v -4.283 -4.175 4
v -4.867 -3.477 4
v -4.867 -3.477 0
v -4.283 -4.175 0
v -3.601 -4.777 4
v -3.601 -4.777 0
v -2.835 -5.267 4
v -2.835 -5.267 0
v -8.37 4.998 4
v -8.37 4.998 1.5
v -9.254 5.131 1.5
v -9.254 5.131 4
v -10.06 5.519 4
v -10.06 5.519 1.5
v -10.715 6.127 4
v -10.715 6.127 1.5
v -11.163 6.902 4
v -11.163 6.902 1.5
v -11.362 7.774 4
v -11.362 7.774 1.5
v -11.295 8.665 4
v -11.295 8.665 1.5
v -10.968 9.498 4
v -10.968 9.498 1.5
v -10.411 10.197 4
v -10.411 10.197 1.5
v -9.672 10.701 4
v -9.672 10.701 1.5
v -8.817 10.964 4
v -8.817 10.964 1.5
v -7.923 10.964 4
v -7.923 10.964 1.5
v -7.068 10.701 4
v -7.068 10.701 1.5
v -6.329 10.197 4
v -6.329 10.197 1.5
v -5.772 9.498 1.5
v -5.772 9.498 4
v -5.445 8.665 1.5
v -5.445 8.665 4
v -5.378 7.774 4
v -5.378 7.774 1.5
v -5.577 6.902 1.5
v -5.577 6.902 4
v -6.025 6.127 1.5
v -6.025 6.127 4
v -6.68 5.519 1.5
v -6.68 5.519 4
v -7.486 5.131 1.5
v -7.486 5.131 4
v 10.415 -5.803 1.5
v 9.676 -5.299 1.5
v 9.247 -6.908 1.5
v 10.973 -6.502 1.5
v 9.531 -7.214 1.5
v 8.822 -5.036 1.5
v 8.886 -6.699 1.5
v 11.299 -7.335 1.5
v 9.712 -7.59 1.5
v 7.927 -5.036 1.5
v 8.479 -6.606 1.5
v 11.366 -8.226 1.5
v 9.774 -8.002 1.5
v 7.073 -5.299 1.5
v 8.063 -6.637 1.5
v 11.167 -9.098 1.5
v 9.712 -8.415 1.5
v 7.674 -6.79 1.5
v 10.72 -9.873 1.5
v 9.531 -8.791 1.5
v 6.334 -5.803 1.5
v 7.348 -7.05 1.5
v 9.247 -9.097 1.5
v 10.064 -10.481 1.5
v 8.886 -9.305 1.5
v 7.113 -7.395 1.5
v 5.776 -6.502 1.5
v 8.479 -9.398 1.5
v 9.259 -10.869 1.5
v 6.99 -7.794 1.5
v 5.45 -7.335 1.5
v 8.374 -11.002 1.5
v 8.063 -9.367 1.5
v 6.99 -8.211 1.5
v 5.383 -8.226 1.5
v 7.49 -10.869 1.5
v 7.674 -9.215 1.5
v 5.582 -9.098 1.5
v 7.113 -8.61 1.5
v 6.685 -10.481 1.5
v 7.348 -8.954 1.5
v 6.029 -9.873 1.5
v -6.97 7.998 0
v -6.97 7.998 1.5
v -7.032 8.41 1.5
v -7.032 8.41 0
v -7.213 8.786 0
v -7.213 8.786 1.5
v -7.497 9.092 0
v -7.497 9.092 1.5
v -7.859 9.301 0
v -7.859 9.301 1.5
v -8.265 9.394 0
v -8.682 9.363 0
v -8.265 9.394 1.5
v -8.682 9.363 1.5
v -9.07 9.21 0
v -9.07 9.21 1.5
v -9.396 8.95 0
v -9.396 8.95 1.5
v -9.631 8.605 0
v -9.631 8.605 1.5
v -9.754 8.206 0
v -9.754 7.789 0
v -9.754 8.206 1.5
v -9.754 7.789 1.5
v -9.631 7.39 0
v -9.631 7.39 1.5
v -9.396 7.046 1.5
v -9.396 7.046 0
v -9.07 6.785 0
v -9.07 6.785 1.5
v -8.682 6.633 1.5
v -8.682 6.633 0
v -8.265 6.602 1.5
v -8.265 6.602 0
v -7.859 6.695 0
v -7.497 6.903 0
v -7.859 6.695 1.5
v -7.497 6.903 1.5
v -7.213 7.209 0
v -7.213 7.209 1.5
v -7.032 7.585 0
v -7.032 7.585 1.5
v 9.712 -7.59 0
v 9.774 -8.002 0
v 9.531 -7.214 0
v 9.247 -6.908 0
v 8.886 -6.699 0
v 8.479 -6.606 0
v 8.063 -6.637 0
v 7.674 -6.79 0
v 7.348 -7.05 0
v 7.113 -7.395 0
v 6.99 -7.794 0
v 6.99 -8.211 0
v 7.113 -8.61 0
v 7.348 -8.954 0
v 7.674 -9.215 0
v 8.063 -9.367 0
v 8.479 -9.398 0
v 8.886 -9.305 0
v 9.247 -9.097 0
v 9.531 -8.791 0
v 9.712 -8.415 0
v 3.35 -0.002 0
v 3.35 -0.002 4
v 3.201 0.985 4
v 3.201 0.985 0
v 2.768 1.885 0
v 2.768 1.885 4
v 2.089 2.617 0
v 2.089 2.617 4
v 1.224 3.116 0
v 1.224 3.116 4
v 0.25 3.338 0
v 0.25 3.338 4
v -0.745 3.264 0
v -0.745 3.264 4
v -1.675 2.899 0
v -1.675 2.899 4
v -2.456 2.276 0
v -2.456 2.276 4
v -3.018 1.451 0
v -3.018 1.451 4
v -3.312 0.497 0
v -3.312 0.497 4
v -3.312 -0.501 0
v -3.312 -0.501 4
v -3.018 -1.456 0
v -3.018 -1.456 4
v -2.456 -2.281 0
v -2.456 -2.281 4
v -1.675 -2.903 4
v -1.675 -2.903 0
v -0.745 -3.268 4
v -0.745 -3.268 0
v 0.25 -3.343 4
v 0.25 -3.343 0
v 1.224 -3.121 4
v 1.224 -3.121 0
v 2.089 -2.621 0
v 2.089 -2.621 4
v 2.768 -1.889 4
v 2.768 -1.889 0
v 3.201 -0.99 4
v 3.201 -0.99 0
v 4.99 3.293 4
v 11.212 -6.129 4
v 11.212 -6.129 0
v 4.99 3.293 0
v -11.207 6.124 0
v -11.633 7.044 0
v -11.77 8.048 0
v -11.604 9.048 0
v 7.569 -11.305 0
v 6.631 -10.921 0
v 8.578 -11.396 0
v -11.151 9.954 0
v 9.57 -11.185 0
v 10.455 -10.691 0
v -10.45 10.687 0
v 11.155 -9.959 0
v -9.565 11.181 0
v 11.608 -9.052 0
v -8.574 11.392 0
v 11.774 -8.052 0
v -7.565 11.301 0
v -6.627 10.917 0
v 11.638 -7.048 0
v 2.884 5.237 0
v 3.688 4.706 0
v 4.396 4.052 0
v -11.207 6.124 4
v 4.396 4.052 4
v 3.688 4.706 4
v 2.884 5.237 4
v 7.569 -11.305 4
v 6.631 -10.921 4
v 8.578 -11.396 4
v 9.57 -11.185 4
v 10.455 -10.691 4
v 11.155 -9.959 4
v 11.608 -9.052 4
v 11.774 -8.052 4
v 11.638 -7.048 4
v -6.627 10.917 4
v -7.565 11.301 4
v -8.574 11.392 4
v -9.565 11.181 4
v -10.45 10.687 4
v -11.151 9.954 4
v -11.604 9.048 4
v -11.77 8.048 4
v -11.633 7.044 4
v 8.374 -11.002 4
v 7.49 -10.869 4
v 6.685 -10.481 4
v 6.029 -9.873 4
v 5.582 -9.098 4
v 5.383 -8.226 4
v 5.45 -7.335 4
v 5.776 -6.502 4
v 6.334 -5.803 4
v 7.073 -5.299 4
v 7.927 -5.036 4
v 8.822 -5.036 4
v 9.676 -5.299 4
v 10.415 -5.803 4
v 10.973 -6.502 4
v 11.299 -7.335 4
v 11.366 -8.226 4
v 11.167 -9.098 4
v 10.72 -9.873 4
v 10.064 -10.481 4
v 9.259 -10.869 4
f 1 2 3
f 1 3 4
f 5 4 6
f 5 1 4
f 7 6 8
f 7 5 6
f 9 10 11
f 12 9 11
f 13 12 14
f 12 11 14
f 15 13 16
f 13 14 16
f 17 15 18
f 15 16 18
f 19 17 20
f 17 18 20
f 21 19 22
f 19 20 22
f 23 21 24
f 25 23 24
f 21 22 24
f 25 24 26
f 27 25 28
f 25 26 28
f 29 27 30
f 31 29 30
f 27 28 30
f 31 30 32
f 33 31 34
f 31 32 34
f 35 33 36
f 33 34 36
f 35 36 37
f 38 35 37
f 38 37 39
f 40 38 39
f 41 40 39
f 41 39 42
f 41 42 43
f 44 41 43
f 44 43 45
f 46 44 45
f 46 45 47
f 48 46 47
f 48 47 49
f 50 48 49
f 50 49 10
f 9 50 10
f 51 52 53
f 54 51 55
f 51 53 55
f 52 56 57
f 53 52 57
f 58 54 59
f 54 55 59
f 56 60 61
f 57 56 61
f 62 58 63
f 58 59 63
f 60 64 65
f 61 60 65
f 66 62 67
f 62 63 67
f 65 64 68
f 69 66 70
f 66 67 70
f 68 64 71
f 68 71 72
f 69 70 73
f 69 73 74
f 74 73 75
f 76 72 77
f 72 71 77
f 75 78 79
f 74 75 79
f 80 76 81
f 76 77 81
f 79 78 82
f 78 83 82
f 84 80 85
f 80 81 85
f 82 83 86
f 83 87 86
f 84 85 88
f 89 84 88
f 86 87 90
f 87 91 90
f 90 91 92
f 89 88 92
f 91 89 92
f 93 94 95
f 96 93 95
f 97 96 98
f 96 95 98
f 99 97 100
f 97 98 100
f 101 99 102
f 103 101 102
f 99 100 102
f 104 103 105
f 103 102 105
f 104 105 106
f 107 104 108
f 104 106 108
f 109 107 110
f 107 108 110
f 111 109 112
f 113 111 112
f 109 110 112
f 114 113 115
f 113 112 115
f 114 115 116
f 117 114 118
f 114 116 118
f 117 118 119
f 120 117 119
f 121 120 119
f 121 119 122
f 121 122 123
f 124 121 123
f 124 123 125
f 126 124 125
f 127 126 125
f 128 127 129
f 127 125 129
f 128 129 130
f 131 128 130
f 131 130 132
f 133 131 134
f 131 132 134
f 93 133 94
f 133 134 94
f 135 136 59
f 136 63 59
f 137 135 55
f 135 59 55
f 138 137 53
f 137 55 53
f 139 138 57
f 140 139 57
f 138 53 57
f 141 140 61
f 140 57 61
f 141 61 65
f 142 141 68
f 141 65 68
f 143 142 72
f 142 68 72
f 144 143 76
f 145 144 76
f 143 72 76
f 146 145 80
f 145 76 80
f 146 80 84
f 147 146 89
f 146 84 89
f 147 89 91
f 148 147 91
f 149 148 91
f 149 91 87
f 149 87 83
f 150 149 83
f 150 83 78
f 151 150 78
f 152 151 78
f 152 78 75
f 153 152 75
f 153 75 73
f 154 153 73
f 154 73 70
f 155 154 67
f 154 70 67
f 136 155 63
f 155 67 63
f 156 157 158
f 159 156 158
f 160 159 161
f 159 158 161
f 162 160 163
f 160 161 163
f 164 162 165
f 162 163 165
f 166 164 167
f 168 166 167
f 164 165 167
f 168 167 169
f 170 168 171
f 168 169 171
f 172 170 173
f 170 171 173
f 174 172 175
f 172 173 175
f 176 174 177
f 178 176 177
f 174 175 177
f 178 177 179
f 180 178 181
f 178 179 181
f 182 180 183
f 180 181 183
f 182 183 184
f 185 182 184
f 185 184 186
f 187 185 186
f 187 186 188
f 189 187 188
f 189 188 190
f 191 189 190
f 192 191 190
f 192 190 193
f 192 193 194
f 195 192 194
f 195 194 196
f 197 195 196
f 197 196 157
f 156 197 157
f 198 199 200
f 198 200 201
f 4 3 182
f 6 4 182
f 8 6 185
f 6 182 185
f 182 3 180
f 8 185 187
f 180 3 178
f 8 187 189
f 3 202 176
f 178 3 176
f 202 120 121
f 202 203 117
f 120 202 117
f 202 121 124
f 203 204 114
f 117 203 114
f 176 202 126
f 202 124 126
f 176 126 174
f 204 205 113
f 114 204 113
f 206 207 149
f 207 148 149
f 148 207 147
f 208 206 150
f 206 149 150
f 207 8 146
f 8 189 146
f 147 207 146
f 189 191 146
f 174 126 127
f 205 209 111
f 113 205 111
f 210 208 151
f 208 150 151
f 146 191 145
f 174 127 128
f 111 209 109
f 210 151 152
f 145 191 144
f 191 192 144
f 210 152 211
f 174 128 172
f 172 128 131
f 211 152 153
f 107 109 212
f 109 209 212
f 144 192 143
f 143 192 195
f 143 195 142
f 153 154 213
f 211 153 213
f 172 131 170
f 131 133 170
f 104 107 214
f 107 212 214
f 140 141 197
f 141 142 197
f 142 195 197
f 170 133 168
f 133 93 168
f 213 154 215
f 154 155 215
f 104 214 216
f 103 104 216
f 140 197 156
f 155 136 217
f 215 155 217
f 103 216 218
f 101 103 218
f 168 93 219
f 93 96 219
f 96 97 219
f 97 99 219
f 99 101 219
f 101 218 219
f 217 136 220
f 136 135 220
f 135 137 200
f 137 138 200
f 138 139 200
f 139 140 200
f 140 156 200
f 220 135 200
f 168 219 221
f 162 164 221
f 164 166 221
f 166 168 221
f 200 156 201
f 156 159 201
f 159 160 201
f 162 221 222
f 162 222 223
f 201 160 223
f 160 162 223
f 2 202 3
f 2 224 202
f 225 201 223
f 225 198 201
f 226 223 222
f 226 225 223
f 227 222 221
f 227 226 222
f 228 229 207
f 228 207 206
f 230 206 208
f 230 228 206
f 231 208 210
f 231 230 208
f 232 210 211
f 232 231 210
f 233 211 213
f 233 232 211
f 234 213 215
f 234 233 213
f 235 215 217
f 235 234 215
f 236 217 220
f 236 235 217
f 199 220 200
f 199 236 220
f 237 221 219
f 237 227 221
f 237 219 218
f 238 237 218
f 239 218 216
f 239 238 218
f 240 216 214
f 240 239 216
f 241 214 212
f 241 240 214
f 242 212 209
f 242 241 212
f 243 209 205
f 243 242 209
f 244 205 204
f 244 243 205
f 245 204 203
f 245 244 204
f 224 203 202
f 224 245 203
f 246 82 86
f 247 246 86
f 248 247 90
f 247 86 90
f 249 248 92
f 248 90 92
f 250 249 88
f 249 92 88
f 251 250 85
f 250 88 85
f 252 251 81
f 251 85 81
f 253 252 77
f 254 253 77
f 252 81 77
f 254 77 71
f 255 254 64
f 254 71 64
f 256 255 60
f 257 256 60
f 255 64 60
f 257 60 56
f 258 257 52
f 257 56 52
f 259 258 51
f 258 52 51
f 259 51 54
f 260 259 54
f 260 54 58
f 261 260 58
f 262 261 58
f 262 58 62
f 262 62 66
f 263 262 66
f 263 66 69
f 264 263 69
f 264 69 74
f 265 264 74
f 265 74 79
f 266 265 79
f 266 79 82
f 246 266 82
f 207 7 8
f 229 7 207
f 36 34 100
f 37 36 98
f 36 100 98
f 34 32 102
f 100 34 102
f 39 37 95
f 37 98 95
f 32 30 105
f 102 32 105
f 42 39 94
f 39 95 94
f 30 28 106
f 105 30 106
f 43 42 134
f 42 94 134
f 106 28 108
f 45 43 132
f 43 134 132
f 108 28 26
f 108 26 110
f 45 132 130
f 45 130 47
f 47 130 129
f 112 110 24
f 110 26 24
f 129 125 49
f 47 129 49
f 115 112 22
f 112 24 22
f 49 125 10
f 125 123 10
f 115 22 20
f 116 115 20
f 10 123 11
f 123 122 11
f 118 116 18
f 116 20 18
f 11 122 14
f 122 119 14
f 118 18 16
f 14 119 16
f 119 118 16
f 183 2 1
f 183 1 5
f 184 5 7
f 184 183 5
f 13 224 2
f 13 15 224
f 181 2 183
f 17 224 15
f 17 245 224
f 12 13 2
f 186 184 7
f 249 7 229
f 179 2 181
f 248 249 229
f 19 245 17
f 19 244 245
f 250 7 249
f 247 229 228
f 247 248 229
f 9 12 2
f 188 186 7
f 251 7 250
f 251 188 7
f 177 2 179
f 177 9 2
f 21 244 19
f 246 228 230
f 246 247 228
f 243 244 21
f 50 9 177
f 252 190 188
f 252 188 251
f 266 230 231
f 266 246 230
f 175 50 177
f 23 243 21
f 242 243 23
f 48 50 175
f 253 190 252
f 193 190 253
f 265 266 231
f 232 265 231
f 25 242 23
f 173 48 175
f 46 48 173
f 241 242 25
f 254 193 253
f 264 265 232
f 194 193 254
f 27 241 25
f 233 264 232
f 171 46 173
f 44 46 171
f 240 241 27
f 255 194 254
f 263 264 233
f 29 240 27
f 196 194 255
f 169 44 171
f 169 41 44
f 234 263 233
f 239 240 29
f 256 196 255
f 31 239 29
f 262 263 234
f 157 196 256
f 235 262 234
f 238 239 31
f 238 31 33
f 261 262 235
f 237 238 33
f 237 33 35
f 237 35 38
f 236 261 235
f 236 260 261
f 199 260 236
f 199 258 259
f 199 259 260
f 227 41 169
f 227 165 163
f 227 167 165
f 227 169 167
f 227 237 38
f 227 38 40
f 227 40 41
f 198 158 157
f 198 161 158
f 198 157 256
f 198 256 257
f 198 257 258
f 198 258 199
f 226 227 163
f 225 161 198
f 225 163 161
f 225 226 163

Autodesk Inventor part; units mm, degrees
ref_plane "YZ Plane" through (0, 0, 0) normal (1, 0, 0) x (0, 1, 0)
ref_plane "XZ Plane" through (0, 0, 0) normal (0, 1, 0) x (-1, 0, 0)
ref_plane "XY Plane" through (0, 0, 0) normal (0, 0, 1) x (1, 0, 0)
sketch "Skizze1" plane through (0, 0, 0) normal (0, 0, 1) x (1, 0, 0)
  circle A0 centre (0.0001, -0.0022) radius 3.9802 projected
  circle A1 centre (-8.37, 7.9978) radius 1.4 projected
  circle A2 centre (8.3745, -8.0022) radius 1.4 projected
  line L0 (-9.5383, 7.2264) -> (-3.2198, -2.3418)
  line L1 (-7.6522, 9.1998) -> (1.8915, 3.4999)
  line L2 (9.5428, -7.2307) -> (3.3215, 2.191)
  line L3 (-1.8517, -3.5253) -> (7.6567, -9.2041)
  point P0 (0, 0)
extrude "Extrusion1" add sketch "Skizze1" along normal blind 4
sketch "Skizze2" plane through (0, 0, 4) normal (0, 0, 1) x (1, 0, 0)
  arc A0 (-7.6522, 9.1998) -> (-9.5383, 7.2264) centre (-8.37, 7.9978) ccw projected
  line L0 (-9.5383, 7.2264) -> (-3.2198, -2.3418) projected
  arc A1 (-3.2198, -2.3418) -> (-1.8517, -3.5253) centre (0.0001, -0.0022) ccw projected
  line L1 (-1.8517, -3.5253) -> (7.6567, -9.2041) projected
  arc A2 (7.6567, -9.2041) -> (9.5428, -7.2307) centre (8.3745, -8.0022) ccw projected
  line L2 (9.5428, -7.2307) -> (3.3215, 2.191) projected
  arc A3 (3.3215, 2.191) -> (1.8915, 3.4999) centre (0.0001, -0.0022) ccw projected
  line L3 (1.8915, 3.4999) -> (-7.6522, 9.1998) projected
  arc A4 (-6.6267, 10.9169) -> (-11.2072, 6.1243) centre (-8.37, 7.9978) ccw
  line L4 (-11.2072, 6.1243) -> (-4.8666, -3.4774)
  arc A5 (-4.8666, -3.4774) -> (-2.8352, -5.2674) centre (0.0001, -0.0022) ccw
  line L5 (-2.8352, -5.2674) -> (6.6312, -10.9212)
  arc A6 (6.6312, -10.9212) -> (11.2118, -6.1287) centre (8.3745, -8.0022) ccw
  line L6 (11.2118, -6.1287) -> (4.9905, 3.2931)
  arc A7 (4.9905, 3.2931) -> (2.8837, 5.2369) centre (0.0001, -0.0022) ccw
  line L7 (2.8837, 5.2369) -> (-6.6267, 10.9169)
  point P0 (0, 0)
  dimension "d2" = 2
extrude "Extrusion2" add sketch "Skizze2" against normal up to surface (4 mm away)
sketch "Skizze3" plane through (0, 0, 4) normal (0, 0, 1) x (1, 0, 0)
  circle A0 centre (0.0001, -0.0022) radius 3.9802 projected
  circle A1 centre (-8.37, 7.9978) radius 1.4 projected
  circle A2 centre (8.3745, -8.0022) radius 1.4 projected
  circle A3 centre (0.0001, -0.0022) radius 3.35
  point P0 (0, 0)
  dimension "d5" = 6.7
extrude "Extrusion3" cut sketch "Skizze3" against normal through all contours A1 | A2 | A3
sketch "Skizze4" plane through (0, 0, 4) normal (0, 0, 1) x (1, 0, 0)
  circle A0 centre (-8.37, 7.9978) radius 1.4 projected
  circle A1 centre (8.3745, -8.0022) radius 1.4 projected
  point P0 (0, 0)
hole "Bohrung1" at (-8.37, 7.9978, 4) at (8.3745, -8.0022, 4) direction (0, 0, -1) diameter 2.8 end through all counterbore diameter 6 counterbore depth 2.5
properties part number "IM_Lensholder"
